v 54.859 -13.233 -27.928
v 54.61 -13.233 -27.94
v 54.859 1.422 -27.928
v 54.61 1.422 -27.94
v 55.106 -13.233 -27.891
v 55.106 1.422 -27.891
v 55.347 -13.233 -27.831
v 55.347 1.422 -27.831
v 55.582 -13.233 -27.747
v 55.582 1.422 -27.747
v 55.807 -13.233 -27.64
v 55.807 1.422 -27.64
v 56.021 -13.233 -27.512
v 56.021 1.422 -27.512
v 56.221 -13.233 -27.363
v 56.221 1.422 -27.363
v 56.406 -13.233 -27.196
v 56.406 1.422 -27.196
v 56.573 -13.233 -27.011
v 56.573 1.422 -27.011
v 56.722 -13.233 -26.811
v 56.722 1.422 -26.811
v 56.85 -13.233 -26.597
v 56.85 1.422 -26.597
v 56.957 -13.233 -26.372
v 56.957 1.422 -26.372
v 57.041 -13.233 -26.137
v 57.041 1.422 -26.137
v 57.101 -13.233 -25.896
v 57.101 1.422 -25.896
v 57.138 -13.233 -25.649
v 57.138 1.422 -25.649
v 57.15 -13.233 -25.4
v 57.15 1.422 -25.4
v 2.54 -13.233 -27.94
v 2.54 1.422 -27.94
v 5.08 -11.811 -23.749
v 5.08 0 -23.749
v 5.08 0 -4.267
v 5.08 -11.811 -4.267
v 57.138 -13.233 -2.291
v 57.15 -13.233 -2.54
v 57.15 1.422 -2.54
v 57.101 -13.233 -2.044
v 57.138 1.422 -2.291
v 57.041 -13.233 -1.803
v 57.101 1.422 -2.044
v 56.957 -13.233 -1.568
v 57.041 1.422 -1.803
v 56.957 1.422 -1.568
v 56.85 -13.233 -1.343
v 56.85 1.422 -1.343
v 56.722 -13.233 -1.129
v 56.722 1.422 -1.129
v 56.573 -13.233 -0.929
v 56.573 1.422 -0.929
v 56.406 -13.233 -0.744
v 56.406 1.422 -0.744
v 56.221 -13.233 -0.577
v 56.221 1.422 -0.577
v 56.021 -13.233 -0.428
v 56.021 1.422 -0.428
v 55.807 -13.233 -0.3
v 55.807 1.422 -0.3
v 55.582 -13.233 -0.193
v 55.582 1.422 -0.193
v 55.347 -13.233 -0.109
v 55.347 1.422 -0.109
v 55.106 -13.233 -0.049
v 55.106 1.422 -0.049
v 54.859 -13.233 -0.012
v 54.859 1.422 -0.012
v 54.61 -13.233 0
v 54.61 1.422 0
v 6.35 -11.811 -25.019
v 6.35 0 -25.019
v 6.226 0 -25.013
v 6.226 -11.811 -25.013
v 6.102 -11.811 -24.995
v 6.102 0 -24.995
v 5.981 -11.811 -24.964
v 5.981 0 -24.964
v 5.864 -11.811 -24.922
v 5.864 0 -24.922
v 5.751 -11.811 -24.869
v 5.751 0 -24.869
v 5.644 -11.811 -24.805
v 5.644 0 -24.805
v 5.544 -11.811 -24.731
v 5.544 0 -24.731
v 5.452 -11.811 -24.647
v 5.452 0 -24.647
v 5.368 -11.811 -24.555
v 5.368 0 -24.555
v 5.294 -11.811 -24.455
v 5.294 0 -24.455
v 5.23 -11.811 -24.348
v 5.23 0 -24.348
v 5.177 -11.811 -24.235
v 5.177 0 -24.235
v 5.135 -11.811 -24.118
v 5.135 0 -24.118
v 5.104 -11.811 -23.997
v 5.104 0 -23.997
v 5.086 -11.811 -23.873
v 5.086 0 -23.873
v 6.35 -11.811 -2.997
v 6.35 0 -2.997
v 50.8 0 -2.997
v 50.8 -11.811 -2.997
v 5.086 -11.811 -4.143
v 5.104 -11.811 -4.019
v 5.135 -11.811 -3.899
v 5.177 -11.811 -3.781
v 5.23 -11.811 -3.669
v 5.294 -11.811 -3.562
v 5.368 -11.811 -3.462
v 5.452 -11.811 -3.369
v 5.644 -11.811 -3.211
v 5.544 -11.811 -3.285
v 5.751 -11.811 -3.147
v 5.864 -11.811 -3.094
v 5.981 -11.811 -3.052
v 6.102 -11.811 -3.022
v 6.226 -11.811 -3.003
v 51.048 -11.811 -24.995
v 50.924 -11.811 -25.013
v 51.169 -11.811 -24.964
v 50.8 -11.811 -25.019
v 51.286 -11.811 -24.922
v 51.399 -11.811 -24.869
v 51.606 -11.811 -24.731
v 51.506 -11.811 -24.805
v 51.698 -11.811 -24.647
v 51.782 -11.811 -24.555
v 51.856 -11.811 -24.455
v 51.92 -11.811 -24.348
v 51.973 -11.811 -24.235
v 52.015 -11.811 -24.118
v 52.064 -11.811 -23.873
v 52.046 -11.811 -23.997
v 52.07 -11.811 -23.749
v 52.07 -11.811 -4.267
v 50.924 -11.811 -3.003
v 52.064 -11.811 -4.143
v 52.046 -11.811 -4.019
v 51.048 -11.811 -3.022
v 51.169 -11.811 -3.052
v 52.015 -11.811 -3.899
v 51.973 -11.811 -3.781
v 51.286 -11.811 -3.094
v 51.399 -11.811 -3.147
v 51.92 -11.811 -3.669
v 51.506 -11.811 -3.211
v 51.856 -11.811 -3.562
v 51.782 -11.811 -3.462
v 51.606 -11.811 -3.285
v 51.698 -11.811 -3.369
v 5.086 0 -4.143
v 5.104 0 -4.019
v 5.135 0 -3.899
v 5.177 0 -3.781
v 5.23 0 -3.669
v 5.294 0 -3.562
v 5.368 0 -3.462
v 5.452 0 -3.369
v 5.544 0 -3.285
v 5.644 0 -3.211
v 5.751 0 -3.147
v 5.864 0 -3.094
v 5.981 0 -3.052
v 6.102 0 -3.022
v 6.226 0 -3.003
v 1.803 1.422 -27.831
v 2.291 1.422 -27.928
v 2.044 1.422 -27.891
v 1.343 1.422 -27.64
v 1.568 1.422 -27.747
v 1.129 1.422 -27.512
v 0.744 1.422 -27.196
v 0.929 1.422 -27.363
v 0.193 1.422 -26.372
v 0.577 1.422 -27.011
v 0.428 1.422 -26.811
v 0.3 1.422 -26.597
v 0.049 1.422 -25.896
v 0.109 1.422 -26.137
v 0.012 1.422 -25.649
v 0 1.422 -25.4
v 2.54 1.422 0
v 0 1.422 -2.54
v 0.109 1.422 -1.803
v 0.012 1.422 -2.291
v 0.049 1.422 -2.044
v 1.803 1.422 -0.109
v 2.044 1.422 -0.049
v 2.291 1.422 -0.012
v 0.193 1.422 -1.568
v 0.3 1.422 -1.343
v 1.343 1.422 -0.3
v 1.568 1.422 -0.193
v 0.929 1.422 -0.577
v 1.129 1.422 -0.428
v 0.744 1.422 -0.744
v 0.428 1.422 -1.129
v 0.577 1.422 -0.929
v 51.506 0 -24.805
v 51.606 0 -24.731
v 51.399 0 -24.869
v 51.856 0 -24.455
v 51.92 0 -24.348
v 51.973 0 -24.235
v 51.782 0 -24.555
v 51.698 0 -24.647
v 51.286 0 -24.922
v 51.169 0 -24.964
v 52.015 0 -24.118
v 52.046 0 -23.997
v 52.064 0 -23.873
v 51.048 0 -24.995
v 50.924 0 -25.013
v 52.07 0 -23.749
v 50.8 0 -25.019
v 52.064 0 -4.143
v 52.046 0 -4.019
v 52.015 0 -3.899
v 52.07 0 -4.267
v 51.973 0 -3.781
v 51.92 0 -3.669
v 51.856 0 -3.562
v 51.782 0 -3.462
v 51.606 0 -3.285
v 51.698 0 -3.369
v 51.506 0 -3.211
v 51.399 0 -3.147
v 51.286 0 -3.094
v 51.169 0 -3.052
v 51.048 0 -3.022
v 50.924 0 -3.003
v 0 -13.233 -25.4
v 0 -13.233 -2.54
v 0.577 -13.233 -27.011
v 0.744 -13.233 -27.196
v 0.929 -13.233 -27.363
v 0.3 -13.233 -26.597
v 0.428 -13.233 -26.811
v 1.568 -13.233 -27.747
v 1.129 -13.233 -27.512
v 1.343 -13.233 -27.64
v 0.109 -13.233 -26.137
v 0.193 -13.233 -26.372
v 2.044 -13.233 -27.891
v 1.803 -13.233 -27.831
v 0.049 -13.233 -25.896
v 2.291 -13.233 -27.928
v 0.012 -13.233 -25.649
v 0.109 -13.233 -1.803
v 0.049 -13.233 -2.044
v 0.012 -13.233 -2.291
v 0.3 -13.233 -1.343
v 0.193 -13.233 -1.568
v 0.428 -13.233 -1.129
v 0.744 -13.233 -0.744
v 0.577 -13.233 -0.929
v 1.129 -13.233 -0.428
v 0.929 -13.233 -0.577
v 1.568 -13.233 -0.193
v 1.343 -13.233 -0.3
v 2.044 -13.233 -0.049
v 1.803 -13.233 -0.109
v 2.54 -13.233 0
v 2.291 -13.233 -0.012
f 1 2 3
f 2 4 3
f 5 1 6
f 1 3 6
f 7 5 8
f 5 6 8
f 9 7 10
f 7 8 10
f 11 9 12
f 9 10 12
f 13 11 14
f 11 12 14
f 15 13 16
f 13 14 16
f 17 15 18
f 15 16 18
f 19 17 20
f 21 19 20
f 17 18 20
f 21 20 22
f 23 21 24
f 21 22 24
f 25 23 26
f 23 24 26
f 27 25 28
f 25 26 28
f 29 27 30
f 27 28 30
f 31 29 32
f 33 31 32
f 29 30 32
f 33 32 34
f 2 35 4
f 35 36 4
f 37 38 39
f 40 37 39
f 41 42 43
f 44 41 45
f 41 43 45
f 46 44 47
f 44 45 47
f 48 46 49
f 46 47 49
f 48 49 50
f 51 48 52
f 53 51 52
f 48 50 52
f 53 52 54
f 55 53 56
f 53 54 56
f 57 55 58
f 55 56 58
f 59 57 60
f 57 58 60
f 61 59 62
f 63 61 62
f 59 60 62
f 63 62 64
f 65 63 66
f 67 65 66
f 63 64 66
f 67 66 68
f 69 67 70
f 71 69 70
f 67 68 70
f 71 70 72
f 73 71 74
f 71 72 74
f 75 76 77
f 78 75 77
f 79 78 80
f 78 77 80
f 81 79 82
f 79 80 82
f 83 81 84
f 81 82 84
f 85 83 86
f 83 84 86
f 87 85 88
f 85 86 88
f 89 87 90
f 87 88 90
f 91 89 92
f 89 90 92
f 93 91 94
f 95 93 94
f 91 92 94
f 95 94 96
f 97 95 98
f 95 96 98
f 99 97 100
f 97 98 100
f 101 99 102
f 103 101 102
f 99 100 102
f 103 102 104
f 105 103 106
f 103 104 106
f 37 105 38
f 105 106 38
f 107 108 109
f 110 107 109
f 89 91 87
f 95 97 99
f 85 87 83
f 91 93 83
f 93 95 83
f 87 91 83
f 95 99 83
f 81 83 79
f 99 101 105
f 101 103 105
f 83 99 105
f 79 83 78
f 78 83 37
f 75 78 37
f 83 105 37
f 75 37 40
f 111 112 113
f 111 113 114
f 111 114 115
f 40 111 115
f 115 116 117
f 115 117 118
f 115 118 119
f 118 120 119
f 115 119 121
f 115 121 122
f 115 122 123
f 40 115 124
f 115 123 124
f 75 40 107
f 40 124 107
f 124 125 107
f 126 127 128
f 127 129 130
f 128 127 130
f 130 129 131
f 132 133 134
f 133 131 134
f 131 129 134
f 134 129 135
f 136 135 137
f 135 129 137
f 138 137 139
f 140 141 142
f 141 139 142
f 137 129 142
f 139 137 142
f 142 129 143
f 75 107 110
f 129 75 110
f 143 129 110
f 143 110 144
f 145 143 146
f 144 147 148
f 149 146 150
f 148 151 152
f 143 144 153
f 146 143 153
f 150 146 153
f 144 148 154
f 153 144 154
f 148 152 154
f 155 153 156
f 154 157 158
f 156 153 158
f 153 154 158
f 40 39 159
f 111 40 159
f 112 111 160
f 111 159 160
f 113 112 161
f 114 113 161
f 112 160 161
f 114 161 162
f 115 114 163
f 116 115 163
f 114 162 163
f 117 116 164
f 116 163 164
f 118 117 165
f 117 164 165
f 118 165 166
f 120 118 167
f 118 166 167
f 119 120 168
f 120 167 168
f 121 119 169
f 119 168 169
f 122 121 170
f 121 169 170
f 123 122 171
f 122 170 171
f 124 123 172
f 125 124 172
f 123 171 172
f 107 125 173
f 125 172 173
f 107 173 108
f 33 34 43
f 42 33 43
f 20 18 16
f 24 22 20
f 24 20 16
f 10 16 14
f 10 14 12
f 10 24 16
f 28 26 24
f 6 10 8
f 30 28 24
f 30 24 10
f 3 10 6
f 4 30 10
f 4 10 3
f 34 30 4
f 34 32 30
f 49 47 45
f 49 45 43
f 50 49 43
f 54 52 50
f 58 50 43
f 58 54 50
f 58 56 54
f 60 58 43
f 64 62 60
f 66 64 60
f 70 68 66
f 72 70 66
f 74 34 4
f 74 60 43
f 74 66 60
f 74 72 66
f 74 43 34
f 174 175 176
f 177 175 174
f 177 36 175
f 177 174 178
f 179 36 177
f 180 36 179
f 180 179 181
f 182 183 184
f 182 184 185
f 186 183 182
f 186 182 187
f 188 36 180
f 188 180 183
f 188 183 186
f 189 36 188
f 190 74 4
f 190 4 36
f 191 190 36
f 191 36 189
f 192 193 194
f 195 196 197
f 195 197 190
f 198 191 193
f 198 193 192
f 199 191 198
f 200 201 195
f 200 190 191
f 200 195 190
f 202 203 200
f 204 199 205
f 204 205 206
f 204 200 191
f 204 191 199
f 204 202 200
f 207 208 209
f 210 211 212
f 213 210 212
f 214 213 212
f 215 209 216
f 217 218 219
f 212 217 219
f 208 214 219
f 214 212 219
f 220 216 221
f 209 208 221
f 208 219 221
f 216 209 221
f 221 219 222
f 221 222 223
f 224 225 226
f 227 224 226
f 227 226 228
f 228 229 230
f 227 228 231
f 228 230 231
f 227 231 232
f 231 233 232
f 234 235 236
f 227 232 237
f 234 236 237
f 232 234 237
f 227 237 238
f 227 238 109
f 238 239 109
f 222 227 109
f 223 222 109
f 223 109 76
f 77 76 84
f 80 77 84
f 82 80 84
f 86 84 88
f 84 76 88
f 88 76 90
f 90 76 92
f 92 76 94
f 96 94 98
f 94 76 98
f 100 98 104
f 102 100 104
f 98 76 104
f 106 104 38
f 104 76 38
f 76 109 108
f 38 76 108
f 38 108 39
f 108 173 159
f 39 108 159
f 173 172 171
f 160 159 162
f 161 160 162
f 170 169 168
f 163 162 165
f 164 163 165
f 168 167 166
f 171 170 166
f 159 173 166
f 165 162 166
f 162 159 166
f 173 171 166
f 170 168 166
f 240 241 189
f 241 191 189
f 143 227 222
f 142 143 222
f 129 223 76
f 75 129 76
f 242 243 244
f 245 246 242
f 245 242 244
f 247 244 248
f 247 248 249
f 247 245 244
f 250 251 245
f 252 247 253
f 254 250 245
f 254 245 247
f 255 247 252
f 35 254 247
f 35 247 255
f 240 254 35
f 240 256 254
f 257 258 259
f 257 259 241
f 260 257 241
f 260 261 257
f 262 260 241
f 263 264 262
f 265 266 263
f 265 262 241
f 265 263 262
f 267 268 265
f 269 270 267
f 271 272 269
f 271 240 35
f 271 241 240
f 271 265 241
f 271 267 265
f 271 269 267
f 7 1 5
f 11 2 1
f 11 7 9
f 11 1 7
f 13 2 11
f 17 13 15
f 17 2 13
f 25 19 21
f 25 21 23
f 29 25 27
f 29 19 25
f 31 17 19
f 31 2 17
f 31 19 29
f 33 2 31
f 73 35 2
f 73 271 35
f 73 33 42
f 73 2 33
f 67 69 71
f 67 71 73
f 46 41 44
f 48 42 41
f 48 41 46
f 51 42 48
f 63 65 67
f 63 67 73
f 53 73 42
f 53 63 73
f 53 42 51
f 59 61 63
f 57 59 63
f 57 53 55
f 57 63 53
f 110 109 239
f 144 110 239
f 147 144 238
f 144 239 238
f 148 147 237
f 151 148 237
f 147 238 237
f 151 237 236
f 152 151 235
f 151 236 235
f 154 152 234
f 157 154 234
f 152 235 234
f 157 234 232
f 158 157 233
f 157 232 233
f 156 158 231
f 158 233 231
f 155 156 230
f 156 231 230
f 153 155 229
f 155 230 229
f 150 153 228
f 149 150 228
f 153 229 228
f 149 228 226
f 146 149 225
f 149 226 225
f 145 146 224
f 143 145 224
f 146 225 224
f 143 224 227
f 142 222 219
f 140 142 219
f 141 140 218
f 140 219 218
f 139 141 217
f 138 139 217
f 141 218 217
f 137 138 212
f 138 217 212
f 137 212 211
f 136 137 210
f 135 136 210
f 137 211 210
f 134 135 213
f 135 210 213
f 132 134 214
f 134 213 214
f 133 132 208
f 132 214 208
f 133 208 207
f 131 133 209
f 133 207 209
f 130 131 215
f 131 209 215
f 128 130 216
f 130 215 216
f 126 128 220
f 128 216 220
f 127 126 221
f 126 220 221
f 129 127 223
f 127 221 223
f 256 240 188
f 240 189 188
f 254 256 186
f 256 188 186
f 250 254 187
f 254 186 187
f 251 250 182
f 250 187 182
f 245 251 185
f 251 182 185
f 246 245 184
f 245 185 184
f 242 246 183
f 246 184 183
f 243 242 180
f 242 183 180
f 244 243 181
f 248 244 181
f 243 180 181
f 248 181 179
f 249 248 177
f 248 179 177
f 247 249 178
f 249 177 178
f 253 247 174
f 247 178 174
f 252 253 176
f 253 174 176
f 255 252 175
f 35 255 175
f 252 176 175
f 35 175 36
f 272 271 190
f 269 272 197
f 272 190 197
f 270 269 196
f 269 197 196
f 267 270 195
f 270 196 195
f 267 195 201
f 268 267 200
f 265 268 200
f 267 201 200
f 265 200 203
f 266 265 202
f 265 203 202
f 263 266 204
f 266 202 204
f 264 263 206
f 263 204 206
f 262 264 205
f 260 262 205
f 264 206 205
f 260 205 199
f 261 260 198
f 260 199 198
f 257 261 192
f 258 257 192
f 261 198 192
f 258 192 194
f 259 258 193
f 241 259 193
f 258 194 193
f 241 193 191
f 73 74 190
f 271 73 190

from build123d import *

# Parameters (mm, degrees)
F1_DEPTH = 11.811
F3_DEPTH = 1.4224
F5_DEPTH = 1.4224


with BuildPart() as f1:
    # F0 (on Front) → F1 (new body)
    with BuildSketch(Plane.XZ):
        with BuildLine():
            Line((54.61, 0), (2.54, 0))
            ThreePointArc((2.54, 0), (0.743949, -0.743949), (0, -2.54))
            Line((0, -2.54), (0, -25.4))
            ThreePointArc((0, -25.4), (0.743949, -27.196051), (2.54, -27.94))
            Line((2.54, -27.94), (54.61, -27.94))
            ThreePointArc((54.61, -27.94), (56.406051, -27.196051), (57.15, -25.4))
            Line((57.15, -25.4), (57.15, -2.54))
            ThreePointArc((57.15, -2.54), (56.406051, -0.743949), (54.61, 0))
        make_face()
        with BuildLine():
            ThreePointArc((5.08, -4.2672), (5.451974, -3.369174), (6.35, -2.9972))
            Line((6.35, -2.9972), (50.8, -2.9972))
            ThreePointArc((50.8, -2.9972), (51.698026, -3.369174), (52.07, -4.2672))
            Line((52.07, -4.2672), (52.07, -23.749))
            ThreePointArc((52.07, -23.749), (51.698026, -24.647026), (50.8, -25.019))
            Line((50.8, -25.019), (6.35, -25.019))
            ThreePointArc((6.35, -25.019), (5.451974, -24.647026), (5.08, -23.749))
            Line((5.08, -23.749), (5.08, -4.2672))
        make_face(mode=Mode.SUBTRACT)
    extrude(amount=F1_DEPTH)

    # F2 (on face) → F3 (join)
    with BuildSketch(Plane(origin=(0, 0, 0), x_dir=(-1, 0, 0), z_dir=(0, 1, 0))):
        with BuildLine():
            ThreePointArc((0, -2.54), (-0.743949, -0.743949), (-2.54, 0))
            Line((-2.54, 0), (-54.61, 0))
            ThreePointArc((-54.61, 0), (-56.406051, -0.743949), (-57.15, -2.54))
            Line((-57.15, -2.54), (-57.15, -25.4))
            ThreePointArc((-57.15, -25.4), (-56.406051, -27.196051), (-54.61, -27.94))
            Line((-54.61, -27.94), (-2.54, -27.94))
            ThreePointArc((-2.54, -27.94), (-0.743949, -27.196051), (0, -25.4))
            Line((0, -25.4), (0, -2.54))
        make_face()
    extrude(amount=F3_DEPTH)

    # F4 (on face) → F5 (join)
    with BuildSketch(Plane.XZ.offset(11.811)):
        with BuildLine():
            Line((54.61, 0), (2.54, 0))
            ThreePointArc((2.54, 0), (0.743949, -0.743949), (0, -2.54))
            Line((0, -2.54), (0, -25.4))
            ThreePointArc((0, -25.4), (0.743949, -27.196051), (2.54, -27.94))
            Line((2.54, -27.94), (54.61, -27.94))
            ThreePointArc((54.61, -27.94), (56.406051, -27.196051), (57.15, -25.4))
            Line((57.15, -25.4), (57.15, -2.54))
            ThreePointArc((57.15, -2.54), (56.406051, -0.743949), (54.61, 0))
        make_face()
    extrude(amount=F5_DEPTH)


solid = f1.part
